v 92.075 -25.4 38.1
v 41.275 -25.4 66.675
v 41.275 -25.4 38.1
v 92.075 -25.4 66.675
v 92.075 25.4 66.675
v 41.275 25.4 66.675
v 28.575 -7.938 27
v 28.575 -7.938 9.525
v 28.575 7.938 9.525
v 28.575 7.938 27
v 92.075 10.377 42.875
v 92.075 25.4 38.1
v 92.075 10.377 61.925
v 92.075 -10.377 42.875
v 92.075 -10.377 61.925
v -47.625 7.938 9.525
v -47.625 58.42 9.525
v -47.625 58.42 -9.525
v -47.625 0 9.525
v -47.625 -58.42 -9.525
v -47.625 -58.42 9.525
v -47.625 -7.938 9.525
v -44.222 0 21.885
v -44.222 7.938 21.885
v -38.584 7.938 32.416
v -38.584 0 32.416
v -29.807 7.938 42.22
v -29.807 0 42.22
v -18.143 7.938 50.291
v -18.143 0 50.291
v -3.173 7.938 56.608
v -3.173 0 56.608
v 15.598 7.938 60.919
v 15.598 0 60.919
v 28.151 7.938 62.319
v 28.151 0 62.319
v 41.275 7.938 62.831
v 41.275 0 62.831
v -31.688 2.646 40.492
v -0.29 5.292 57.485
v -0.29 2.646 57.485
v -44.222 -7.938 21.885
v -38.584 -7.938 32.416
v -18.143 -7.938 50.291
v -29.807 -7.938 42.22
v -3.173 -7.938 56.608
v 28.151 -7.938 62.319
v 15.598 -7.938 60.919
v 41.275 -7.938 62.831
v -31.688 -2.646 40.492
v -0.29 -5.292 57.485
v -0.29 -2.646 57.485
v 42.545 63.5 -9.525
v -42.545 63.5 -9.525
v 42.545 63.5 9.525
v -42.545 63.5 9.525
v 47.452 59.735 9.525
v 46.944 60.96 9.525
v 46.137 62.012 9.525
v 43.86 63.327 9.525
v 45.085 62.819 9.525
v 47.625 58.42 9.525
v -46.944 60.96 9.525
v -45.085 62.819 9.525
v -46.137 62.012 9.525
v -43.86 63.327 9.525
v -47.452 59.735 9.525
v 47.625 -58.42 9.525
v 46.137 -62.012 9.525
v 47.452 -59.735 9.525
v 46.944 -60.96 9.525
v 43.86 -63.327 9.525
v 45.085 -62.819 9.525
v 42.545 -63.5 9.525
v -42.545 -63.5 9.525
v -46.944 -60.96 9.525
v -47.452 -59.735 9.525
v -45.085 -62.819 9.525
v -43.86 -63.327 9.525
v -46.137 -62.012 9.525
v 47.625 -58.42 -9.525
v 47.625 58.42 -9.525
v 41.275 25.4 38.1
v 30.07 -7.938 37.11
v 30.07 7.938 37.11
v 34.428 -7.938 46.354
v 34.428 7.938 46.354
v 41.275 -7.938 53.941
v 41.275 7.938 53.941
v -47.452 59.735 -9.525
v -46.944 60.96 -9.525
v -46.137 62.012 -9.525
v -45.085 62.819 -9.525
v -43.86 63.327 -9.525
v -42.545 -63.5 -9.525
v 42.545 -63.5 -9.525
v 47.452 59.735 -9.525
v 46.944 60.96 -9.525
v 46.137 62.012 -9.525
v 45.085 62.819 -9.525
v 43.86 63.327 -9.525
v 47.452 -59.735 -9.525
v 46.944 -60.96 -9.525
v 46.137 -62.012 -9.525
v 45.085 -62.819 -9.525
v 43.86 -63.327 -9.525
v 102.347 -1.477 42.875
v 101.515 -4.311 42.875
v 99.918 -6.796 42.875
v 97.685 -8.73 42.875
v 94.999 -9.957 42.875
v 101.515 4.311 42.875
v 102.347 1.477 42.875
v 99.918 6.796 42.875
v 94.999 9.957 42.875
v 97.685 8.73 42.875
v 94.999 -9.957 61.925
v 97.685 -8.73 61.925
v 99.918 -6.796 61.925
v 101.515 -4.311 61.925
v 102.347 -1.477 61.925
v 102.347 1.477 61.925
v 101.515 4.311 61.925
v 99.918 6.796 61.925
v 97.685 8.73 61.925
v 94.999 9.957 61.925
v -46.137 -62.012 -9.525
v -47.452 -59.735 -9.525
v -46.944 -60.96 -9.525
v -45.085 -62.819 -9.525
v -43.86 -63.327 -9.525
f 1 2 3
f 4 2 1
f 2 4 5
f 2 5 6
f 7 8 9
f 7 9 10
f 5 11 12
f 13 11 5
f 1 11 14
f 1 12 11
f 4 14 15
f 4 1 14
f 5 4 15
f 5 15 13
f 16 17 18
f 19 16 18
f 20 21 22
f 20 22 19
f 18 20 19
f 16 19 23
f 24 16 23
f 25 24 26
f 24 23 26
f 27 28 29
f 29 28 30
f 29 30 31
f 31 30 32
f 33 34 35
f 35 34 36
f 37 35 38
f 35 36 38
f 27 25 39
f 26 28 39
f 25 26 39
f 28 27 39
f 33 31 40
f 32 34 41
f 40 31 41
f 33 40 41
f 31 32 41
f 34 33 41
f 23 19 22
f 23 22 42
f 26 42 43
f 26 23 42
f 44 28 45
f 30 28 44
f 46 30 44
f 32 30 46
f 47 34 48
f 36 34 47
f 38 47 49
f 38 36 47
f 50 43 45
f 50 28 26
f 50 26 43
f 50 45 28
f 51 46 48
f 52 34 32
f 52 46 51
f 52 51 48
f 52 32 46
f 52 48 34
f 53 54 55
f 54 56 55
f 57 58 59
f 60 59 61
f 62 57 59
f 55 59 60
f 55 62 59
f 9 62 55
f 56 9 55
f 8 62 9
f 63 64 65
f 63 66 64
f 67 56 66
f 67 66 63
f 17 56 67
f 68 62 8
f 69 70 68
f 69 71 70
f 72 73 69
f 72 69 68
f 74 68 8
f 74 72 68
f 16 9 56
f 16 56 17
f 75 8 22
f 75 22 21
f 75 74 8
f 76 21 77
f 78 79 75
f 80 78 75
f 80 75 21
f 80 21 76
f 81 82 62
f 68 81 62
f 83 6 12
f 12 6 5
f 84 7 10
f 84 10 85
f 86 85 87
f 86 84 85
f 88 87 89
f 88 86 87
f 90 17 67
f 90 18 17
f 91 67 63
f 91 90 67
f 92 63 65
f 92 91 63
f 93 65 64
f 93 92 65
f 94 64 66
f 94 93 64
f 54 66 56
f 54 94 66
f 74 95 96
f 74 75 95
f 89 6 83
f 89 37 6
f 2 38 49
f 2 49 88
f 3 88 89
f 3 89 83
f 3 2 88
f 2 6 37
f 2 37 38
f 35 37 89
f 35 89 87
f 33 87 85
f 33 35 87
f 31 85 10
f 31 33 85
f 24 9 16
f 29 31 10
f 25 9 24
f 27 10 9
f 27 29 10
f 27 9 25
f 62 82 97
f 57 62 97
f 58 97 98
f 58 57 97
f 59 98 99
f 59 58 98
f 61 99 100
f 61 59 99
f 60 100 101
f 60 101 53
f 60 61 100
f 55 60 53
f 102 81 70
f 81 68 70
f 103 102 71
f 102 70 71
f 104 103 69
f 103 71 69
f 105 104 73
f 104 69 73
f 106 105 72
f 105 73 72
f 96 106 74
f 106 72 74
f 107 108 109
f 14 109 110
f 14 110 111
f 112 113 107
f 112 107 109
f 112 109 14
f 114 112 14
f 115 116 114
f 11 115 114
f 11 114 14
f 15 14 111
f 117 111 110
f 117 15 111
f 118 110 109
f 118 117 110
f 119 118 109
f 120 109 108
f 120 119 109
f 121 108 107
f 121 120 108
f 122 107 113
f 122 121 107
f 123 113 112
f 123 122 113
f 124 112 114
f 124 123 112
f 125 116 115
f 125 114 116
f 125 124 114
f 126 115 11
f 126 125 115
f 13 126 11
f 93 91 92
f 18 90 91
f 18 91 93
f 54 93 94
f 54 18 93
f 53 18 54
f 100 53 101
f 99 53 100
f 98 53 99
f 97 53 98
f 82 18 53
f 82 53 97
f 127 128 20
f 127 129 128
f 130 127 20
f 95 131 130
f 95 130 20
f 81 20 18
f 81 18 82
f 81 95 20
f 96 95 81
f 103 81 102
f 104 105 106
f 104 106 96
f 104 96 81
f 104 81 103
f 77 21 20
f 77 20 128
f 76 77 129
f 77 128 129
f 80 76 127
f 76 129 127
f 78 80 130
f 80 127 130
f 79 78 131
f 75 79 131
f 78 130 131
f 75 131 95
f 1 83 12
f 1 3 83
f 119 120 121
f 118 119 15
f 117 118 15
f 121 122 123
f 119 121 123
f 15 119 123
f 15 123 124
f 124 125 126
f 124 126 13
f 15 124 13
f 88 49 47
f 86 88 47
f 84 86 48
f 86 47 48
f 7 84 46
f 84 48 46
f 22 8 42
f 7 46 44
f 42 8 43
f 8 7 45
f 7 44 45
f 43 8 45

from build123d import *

# Parameters (mm, degrees)
F1_DEPTH = 63.5
F2_DEPTH = 7.9375
F3_DEPTH = 25.4
F0_W     = 10.3774026796
F0_H     = 19.05
F5_R     = 5.08


with BuildPart() as f1:
    # F0 (on Front) → F1 (new body, symmetric)
    with BuildSketch(Plane.XZ):
        Polygon((-47.625, -9.525), (47.625, -9.525), (47.625, 9.525), (28.575, 9.525), (-47.625, 9.525), align=None)
    extrude(amount=F1_DEPTH, both=True)

    # F0 (on Front) → F2 (join, symmetric)
    with BuildSketch(Plane.XZ):
        with BuildLine():
            add(Edge.make_bspline(
                [(-47.625, 9.525), (-41.1829413646, 48.2544610148), (-3.609227819, 62.5325655632), (41.275, 62.8309662256)],
                knots=[0, 0, 0, 0, 105.7723986336, 105.7723986336, 105.7723986336, 105.7723986336], degree=3))
            Line((-47.625, 9.525), (28.575, 9.525))
            Line((28.575, 9.525), (28.575, 27.0002))
            ThreePointArc((28.575, 27.0002), (31.9091488719, 41.8922700374), (41.275, 53.9409683632))
            Line((41.275, 53.9409683632), (41.275, 62.8309662256))
        make_face()
    extrude(amount=F2_DEPTH, both=True)

    # F0 (on Front) → F3 (join, symmetric)
    with BuildSketch(Plane.XZ):
        with BuildLine():
            ThreePointArc((63.5, 42.8752), (57.3434465811, 41.6327826497), (52.1505478123, 38.1))
            Line((52.1505478123, 38.1), (92.075, 38.1))
            Line((92.075, 38.1), (92.075, 42.8752))
            Line((92.075, 42.8752), (63.5, 42.8752))
        make_face()
        with BuildLine():
            Line((41.275, 66.675), (41.275, 62.8309662256))
            add(Edge.make_bspline(
                [(41.275, 62.8309662256), (48.5260198489, 62.8791726721), (55.9678310127, 62.5625339124), (63.5, 61.9252)],
                knots=[105.7723986336, 105.7723986336, 105.7723986336, 105.7723986336, 122.8598656398, 122.8598656398, 122.8598656398, 122.8598656398], degree=3))
            Line((63.5, 61.9252), (92.075, 61.9252))
            Line((92.075, 61.9252), (92.075, 66.675))
            Line((92.075, 66.675), (41.275, 66.675))
        make_face()
        with BuildLine():
            add(Edge.make_bspline(
                [(41.275, 62.8309662256), (48.5260198489, 62.8791726721), (55.9678310127, 62.5625339124), (63.5, 61.9252)],
                knots=[105.7723986336, 105.7723986336, 105.7723986336, 105.7723986336, 122.8598656398, 122.8598656398, 122.8598656398, 122.8598656398], degree=3))
            Line((41.275, 62.8309662256), (41.275, 53.9409683632))
            ThreePointArc((41.275, 53.9409683632), (51.6921786532, 59.8685887655), (63.5, 61.9252))
        make_face()
        with BuildLine():
            Line((41.275, 38.1), (52.1505478123, 38.1))
            ThreePointArc((52.1505478123, 38.1), (57.3434465811, 41.6327826497), (63.5, 42.8752))
            Line((63.5, 42.8752), (92.075, 42.8752))
            Line((92.075, 42.8752), (92.075, 61.9252))
            Line((92.075, 61.9252), (63.5, 61.9252))
            ThreePointArc((63.5, 61.9252), (51.6921786532, 59.8685887655), (41.275, 53.9409683632))
            Line((41.275, 53.9409683632), (41.275, 38.1))
        make_face()
    extrude(amount=F3_DEPTH, both=True)

    # F0 (on Front) → F4 (revolve)
    with BuildSketch(Plane.XZ):
        with Locations((97.2637013398, 52.4002)):
            Rectangle(F0_W, F0_H)
    revolve(axis=Axis((92.075, 0, 52.3875), (0, 0, 1)))

    # F5
    f5_edges = [f1.edges().sort_by_distance(p)[0] for p in [
        (-47.625, -63.5, 0),
        (47.625, -63.5, 0),
        (47.625, 63.5, 0),
        (-47.625, 63.5, 0),
    ]]
    fillet(f5_edges, radius=F5_R)


solid = f1.part
